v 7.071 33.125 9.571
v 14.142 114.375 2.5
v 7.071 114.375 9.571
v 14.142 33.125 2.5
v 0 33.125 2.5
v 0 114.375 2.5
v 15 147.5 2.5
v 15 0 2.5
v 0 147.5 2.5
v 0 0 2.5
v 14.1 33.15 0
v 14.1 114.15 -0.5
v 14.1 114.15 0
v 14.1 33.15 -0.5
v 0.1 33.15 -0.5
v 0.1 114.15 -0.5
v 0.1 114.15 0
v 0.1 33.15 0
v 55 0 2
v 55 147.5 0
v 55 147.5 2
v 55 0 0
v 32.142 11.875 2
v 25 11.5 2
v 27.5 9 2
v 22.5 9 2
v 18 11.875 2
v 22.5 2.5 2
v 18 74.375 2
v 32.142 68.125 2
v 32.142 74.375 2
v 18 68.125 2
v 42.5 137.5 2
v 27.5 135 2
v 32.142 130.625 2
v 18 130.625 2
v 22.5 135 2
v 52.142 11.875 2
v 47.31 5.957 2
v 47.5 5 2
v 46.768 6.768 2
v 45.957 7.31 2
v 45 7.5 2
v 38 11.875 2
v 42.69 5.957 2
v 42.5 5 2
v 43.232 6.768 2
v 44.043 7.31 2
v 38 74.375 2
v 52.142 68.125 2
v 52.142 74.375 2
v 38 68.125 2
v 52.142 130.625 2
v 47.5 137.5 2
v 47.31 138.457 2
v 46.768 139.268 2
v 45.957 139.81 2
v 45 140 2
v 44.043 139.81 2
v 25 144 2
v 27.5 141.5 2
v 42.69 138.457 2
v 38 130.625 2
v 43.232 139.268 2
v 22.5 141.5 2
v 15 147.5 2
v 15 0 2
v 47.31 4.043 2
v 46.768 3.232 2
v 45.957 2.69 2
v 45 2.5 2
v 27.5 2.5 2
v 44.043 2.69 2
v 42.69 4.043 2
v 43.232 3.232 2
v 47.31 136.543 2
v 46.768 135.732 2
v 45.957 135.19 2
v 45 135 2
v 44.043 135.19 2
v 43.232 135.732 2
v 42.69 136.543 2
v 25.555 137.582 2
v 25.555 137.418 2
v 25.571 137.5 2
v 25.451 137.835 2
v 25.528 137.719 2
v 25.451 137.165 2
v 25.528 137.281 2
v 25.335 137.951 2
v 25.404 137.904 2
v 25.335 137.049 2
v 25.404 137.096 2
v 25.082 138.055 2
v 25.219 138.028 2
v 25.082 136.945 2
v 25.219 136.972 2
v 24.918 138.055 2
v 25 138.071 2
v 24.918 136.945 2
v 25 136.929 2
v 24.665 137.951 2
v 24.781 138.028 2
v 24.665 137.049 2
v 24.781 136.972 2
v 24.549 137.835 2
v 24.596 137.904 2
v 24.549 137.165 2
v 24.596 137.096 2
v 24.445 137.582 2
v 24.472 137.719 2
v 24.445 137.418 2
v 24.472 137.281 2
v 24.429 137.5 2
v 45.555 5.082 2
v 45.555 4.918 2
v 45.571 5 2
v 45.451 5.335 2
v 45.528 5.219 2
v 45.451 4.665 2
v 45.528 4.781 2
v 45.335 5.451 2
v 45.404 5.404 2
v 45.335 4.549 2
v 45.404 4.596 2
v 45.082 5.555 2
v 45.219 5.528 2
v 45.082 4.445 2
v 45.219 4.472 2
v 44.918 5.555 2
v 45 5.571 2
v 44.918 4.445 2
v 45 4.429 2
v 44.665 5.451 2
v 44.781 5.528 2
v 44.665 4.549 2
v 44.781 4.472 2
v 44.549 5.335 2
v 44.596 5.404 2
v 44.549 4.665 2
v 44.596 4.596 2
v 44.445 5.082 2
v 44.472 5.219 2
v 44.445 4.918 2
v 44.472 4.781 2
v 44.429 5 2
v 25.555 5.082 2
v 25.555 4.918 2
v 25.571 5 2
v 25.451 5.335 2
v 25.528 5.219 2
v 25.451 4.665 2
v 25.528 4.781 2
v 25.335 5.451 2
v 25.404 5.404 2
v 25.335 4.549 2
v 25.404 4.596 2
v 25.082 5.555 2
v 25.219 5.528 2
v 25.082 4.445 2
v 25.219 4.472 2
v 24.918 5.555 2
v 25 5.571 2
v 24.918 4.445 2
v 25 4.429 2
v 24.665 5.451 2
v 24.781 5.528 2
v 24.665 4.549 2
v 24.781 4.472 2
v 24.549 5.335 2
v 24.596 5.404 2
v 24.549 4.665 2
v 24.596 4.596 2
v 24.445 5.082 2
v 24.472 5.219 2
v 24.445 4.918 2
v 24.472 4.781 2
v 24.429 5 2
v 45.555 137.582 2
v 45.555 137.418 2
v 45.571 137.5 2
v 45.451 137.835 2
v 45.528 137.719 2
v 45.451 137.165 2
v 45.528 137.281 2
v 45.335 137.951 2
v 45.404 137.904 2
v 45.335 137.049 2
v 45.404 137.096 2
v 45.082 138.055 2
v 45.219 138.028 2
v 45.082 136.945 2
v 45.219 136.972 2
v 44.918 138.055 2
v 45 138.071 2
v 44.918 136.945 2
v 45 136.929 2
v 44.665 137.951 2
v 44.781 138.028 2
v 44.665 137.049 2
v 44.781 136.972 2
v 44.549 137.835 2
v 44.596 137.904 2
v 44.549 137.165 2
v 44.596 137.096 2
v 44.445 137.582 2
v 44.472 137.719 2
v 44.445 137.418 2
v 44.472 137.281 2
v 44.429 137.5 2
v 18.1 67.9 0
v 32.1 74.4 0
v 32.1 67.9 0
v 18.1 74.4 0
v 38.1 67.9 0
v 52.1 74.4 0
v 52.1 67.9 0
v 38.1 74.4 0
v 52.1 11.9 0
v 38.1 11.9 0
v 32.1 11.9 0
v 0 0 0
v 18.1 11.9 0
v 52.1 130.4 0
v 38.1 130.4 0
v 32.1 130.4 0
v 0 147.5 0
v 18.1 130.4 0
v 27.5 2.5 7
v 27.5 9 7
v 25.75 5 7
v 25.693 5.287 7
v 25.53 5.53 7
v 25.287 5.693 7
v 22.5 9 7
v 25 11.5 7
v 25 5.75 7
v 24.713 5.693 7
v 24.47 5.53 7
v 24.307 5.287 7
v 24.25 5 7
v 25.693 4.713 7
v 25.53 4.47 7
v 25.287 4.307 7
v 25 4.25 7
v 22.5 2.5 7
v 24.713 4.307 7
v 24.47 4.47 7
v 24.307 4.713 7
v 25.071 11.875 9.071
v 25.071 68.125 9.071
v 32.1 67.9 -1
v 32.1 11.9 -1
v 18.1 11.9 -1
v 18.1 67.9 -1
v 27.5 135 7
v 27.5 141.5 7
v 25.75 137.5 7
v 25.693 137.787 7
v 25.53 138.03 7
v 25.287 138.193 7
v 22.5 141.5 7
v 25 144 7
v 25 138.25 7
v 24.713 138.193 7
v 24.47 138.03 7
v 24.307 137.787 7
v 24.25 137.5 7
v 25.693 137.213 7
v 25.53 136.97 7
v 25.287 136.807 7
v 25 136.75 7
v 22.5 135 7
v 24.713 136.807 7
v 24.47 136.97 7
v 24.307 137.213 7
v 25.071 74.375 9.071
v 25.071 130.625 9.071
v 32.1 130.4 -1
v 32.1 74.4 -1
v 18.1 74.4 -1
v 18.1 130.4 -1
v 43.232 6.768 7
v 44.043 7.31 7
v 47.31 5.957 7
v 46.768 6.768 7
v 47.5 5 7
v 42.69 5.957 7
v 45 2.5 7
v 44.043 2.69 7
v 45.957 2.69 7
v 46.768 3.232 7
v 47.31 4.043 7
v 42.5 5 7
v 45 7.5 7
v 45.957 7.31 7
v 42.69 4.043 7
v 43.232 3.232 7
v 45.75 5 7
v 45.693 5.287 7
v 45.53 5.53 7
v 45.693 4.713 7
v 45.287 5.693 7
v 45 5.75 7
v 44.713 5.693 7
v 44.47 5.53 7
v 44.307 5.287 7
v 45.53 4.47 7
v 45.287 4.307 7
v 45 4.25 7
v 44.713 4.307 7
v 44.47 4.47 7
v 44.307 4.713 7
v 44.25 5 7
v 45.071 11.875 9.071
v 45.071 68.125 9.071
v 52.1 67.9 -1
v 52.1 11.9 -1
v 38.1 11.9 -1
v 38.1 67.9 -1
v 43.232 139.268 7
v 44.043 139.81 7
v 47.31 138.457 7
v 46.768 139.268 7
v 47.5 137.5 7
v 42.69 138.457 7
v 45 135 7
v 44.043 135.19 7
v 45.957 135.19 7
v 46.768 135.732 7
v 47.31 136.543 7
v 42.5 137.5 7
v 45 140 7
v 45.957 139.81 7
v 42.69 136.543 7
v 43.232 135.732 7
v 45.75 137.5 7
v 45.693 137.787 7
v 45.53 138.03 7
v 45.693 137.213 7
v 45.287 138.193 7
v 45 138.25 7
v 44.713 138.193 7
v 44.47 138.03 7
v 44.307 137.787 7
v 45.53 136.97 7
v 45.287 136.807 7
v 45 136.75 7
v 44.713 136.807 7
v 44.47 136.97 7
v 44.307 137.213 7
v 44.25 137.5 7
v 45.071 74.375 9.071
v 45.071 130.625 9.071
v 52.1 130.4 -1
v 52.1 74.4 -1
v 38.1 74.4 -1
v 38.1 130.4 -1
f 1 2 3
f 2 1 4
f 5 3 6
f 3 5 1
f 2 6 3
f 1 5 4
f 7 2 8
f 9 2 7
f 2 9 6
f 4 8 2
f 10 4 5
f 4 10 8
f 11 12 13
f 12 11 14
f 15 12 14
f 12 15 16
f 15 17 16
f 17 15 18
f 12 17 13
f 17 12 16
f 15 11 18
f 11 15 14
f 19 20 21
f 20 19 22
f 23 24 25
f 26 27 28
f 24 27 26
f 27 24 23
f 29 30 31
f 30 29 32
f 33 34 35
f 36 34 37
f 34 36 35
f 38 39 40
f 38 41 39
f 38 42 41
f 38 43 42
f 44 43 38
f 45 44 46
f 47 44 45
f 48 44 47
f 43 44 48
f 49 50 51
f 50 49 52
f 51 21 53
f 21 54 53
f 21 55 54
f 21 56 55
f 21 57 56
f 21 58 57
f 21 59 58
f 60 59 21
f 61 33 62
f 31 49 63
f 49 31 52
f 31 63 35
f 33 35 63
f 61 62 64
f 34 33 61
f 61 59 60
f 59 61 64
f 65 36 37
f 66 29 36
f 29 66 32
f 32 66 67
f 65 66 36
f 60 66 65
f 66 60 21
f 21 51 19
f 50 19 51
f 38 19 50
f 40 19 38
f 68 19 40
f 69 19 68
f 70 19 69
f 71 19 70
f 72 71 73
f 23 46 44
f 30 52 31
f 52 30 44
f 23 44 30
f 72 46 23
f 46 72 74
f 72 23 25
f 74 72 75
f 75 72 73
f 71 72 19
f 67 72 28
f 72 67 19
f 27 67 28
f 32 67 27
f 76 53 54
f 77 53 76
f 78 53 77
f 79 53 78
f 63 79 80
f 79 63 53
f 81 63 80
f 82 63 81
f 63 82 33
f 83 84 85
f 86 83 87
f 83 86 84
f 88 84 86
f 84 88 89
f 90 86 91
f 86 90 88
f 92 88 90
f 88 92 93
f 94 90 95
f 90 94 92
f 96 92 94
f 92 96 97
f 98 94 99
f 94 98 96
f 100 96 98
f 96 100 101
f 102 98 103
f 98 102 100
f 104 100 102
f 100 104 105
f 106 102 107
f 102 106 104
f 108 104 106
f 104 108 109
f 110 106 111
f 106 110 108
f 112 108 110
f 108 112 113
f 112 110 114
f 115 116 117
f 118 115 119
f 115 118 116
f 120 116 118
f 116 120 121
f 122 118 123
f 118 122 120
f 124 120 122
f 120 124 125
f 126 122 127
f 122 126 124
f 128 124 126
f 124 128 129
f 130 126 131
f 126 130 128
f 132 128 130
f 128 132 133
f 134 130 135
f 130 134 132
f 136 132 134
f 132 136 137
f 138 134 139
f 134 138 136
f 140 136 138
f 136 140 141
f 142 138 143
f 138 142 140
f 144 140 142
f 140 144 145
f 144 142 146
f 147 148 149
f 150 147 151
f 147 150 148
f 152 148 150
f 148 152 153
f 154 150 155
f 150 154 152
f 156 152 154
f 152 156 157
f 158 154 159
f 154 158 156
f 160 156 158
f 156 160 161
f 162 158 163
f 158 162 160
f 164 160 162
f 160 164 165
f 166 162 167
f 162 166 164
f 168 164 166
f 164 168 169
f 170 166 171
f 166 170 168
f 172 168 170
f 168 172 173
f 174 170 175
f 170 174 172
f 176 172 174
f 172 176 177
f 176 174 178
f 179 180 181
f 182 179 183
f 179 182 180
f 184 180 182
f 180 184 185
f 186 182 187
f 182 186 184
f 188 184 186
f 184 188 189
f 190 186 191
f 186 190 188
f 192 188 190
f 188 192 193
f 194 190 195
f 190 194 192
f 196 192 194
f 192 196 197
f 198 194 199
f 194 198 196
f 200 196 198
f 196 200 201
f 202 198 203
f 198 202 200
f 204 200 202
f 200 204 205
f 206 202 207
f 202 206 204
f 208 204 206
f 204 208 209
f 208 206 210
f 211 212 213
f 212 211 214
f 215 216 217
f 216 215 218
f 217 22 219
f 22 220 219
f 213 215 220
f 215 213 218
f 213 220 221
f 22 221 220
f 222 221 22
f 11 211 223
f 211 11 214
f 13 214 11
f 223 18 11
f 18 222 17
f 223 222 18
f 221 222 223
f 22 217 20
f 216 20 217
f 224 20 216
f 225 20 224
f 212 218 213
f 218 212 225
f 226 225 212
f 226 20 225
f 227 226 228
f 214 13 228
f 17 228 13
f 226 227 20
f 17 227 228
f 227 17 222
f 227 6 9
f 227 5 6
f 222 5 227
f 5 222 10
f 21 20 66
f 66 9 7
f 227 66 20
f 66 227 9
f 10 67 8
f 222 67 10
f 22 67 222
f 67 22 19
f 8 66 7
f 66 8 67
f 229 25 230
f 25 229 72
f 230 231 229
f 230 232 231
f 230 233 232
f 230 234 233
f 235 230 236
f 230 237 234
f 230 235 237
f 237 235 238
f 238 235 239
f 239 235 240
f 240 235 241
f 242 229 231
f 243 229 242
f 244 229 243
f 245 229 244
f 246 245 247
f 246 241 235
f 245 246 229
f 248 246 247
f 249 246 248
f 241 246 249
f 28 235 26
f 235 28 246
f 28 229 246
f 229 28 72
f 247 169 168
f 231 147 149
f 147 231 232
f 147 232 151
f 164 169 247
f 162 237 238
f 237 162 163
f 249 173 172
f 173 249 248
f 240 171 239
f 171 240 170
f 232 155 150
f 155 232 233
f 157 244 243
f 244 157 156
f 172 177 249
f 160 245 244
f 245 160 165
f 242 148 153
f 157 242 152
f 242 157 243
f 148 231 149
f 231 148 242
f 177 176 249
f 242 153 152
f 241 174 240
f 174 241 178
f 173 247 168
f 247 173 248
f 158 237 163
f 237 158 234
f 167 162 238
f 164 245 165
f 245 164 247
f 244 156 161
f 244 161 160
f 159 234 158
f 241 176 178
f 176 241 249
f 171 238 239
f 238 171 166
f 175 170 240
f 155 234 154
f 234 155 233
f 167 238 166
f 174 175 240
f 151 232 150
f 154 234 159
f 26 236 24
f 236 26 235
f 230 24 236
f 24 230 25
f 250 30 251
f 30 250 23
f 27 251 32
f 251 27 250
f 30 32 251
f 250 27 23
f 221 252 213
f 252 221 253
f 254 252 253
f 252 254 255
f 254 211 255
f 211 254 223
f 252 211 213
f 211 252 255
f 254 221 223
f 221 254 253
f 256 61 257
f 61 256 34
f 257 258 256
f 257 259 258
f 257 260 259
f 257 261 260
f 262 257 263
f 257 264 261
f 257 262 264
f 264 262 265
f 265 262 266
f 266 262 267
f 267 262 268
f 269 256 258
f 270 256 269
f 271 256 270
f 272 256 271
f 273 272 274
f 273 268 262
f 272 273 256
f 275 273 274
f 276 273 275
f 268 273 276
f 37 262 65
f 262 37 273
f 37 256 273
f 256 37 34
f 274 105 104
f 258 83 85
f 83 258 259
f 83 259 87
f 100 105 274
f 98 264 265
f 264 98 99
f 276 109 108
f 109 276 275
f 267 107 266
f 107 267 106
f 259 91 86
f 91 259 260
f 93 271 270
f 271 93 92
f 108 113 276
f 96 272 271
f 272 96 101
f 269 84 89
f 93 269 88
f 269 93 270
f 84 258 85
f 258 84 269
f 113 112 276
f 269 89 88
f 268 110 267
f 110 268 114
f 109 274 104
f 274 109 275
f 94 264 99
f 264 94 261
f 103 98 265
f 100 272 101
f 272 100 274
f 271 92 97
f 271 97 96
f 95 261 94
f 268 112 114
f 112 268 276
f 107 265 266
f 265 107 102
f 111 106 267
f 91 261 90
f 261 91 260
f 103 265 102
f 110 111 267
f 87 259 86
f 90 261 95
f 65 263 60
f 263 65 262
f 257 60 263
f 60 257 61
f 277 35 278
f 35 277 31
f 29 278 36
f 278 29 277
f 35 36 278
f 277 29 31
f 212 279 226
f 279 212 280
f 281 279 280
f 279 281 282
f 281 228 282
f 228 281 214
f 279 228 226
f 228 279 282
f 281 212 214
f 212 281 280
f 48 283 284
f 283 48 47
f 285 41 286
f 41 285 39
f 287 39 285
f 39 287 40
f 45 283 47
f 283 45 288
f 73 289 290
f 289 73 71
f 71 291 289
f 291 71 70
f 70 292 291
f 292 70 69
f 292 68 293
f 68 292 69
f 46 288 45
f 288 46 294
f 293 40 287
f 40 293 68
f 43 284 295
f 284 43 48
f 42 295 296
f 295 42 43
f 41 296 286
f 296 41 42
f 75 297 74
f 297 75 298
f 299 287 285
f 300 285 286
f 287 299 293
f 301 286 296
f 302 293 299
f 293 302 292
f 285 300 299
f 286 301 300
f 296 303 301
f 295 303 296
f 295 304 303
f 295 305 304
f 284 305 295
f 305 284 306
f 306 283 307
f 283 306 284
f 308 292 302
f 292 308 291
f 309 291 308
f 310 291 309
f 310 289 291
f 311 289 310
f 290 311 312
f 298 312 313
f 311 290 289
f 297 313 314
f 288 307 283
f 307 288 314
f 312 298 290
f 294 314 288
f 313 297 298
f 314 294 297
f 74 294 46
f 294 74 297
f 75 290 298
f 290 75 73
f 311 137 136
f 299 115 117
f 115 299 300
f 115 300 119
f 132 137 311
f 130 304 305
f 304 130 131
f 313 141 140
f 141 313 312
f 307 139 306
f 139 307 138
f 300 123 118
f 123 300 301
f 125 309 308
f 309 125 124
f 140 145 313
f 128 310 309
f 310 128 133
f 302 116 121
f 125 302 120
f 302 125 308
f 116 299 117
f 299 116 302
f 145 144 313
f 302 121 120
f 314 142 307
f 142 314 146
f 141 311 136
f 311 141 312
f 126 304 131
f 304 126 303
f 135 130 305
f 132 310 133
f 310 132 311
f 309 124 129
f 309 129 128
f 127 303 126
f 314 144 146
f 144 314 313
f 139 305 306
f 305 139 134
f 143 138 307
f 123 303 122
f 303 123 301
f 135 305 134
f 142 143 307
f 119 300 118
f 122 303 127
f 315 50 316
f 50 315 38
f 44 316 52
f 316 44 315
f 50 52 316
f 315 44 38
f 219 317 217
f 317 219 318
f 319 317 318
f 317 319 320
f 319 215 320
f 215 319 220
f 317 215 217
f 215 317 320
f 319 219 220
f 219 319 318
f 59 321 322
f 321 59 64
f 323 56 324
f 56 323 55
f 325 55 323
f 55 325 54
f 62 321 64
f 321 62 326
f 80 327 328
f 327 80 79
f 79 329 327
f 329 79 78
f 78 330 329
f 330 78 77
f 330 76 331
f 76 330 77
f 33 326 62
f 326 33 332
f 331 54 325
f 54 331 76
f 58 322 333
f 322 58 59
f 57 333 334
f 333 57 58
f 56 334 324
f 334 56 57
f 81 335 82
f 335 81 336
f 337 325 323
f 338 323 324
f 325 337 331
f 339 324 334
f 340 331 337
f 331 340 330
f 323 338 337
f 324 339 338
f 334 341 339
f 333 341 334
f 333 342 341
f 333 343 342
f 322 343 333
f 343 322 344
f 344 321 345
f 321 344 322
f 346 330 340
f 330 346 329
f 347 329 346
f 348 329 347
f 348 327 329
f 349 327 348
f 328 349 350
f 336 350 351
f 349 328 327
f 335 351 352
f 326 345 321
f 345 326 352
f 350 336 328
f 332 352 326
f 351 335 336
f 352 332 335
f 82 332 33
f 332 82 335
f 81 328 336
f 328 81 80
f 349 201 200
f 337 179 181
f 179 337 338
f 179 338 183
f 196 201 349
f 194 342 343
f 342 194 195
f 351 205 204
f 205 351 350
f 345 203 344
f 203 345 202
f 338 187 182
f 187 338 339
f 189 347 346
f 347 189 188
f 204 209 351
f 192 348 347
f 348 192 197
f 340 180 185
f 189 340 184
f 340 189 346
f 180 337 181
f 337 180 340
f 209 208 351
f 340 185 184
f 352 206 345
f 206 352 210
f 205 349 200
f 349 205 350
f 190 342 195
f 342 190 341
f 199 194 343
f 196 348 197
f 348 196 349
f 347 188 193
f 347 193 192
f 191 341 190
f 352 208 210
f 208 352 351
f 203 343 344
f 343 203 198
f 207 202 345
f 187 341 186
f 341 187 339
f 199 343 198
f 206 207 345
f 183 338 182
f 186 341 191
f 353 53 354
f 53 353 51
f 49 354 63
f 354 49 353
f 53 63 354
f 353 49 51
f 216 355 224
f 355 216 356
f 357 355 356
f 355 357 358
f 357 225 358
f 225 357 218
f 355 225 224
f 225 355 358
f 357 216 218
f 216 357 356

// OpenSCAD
// file: ../OpenSCAD/Pin.scad
// Height of pins
pinHeight = 7;      // was 7
// ----------------------------------------------------- //
// Draw a cylinder and drill a hole in it                //
// ----------------------------------------------------- //
module pin(px, py, pz) {
    translate([px, py, pz]) {
        difference() {
            cylinder(h=pinHeight, r=2.5, $fn=16);
            translate([2, 2, 1]);
                cylinder(h=pinHeight, r1=0.5, r2=0.75, $fn=16);
        }
    }   
}

// pin(0, 0, 0);
// file: ../OpenSCAD/brailleAndText.scad
/*
Braille Module
http://creativecommons.org/licenses/by/3.0/
*/


// mm sizes from http://dots.physics.orst.edu/gs_layout.html
radius = 0.25;
spacing = 2.5;
startOffset = 3.75;
distance = startOffset + spacing;

plate_height = 10;
plate_thickness = 10;   // was 2.

$fn = 10;



module letter(bitmap, char) {
//    echo(char);
	row_size = 2;
	col_size = 3;
	bitmap_size = row_size * col_size;
	
	function loc_x(loc) = floor(loc / row_size) * spacing + spacing;
	function loc_y(loc) = loc % row_size * spacing  + (distance-spacing)/2;

    translate([0, loc_y(-1), -2]) {
        rotate([270, 0, 90]) {
            linear_extrude(height = 1.25)
            text(char, 6);
        }
    }
	
    for (loc = [0:bitmap_size - 1]) {
		if (bitmap[loc] != 0) {
			union() {
				translate(v = [loc_x(loc), loc_y(loc), 0]) {
					sphere(radius = radius* bitmap[loc], center = true);
				}
			}
		}
	}
}


module braille_char(char) {
	if (char == "A" || char == "a") {
		letter([
			1,0,
			0,0,
			0,0
		], char);
	} else if (char == "B" || char == "b") {
		letter([
			1,0,
			1,0,
			0,0
		], char);
	} else if (char == "C" || char == "c") {
		letter([
			1,1,
			0,0,
			0,0
		], char);
	} else if (char == "D" || char == "d") {
		letter([
			1,1,
			0,1,
			0,0
		], char);
	} else if (char == "E" || char == "e") {
		letter([
			1,0,
			0,1,
			0,0
		], char);
	} else if (char == "F" || char == "f") {
		letter([
			1,1,
			1,0,
			0,0
		], char);
	} else if (char == "G" || char == "g") {
		letter([
			1,1,
			1,1,
			0,0
		], char);
	} else if (char == "H" || char == "h") {
		letter([
			1,0,
			1,1,
			0,0
		], char);
	} else if (char == "I" || char == "i") {
		letter([
			0,1,
			1,0,
			0,0
		], char);
	} else if (char == "J" || char == "j") {
		letter([
			0,1,
			1,1,
			0,0
		], char);
	} else if (char == "K" || char == "k") {
		letter([
			1,0,
			0,0,
			1,0
		], char);
	} else if (char == "L" || char == "l") {
		letter([
			1,0,
			1,0,
			1,0
		], char);
	} else if (char == "M" || char == "m") {
		letter([
			1,1,
			0,0,
			1,0
		], char);
	} else if (char == "N" || char == "n") {
		letter([
			1,1,
			0,1,
			1,0
		], char);
	} else if (char == "O" || char == "o") {
		letter([
			1,0,
			0,1,
			1,0
		], char);
	} else if (char == "P" || char == "p") {
		letter([
			1,1,
			1,0,
			1,0
		], char);
	} else if (char == "Q" || char == "q") {
		letter([
			1,1,
			1,1,
			1,0
		], char);
	} else if (char == "R" || char == "r") {
		letter([
			1,0,
			1,1,
			1,0
		], char);
	} else if (char == "S" || char == "s") {
		letter([
			0,1,
			1,0,
			1,0
		], char);
	} else if (char == "T" || char == "t") {
		letter([
			0,1,
			1,1,
			1,0
		], char);
	} else if (char == "U" || char == "u") {
		letter([
			1,0,
			0,0,
			1,1
		], char);
	} else if (char == "V" || char == "v") {
		letter([
			1,0,
			1,1,
			1,0
		], char);
	} else if (char == "W" || char == "w") {
		letter([
			0,1,
			1,1,
			0,1
		], char);
	} else if (char == "X" || char == "x") {
		letter([
			1,1,
			0,0,
			1,1
		], char);
	} else if (char == "Y" || char == "y") {
		letter([
			1,1,
			0,1,
			1,1
		], char);
	} else if (char == "Z" || char == "z") {
		letter([
			1,0,
			0,1,
			1,1
		], char);
    } else if (char == " ") {
		letter([
			0,0,
			0,0,
			0,0
		], char);
	} else {
		echo("Invalid Character: ", char);
	}

}

module braille_str(chars) {
    char_count = len(chars);
	echo(str("Total Width of ", chars, " : ",  distance * char_count, "mm"));
	union() {
		for (count = [0:char_count-1]) {
			translate(v = [0, count * distance, plate_thickness]) {
				braille_char(chars[count]);
			}
		}
		translate(v = [0, -distance/2, 0]) {
			color([0,0,1]) {
				cube(size = [plate_height, distance * (char_count+1), plate_thickness]);
			}
            }                                                      
	}
}

function lenText(txt="Hi") = distance * len(txt);

module printTextAndBraille(textToPrint) {
    blockLen = lenText(textToPrint);
    union()
    {
        difference() {                      // remove second box from first
            rotate([0,45,0]) {              // make it on its edge
                braille_str((textToPrint)); // make a long box
            }
            translate([0, -3.25, -8]) {     // move in right place
                cube(size = [14, (blockLen+8), 8]);
            }
        } 
        translate([0.1, -3.1, -3]) {     // move in right place
            cube(size = [14, (blockLen+6), 3]); 
        }
    }                                 
}

printTextAndBraille("HELLO CalLUM");
// file: ../OpenSCAD/BPNode.scad
use <brailleAndText.scad>;
use <Pin.scad>;

// These are to be overridden in the generated file
// ... they are used to calculate size of base.
numLines = 1;  // was 5
longestLine = "abcdefghijk";

// Thickness of base
bedHeight = 2;      // was 4
// Thickness of top section
reliefHeight = 2.5;   // was 6
// Height of pins
pinHeight = 7;      // was 7

// size of base
baseWidth = 35 + len(longestLine) * 6.25;   // was 40
//baseWidth = 100;
baseDepth = (numLines - 1) * 20 + 15;
// depth of top section
reliefDepth = 15;

// Offsets for each line
line1 = 7;
line2 = line1 + 18;
line3 = line2 + 20;
line4 = line3 + 20;
line5 = line4 + 20;
line6 = line5 + 20;
line7 = line6 + 20;
line8 = line7 + 20;

// offset for items on the left and right
left = 5;
right = baseWidth - 10;


// ----------------------------------------------------- //
// Draw base, add raised area for title and add title    //
// ----------------------------------------------------- //
module drawBase(title) { 
    cube([baseDepth,baseWidth,bedHeight]);      // Base
    cube([reliefDepth,baseWidth,reliefHeight]); // Top
    translate([0, (baseWidth/2 - lenText(title)/2), reliefHeight])
        printTextAndBraille(title);             // Title
}

// -------------------------------------------------------------- //
// Draw cube and drill a hole in it,                              //
// - then add a cylinder made with four segments (i.e. a diamond) //
// -------------------------------------------------------------- //
module executePin(px, py) {
    translate([px, py, 0]) {
        difference() {
            translate([-2.5, -2.5, 0])
            cube([5, 6.5, pinHeight]);
            translate([2, 2, 1]);
            cylinder(h=pinHeight, r1=0.5, r2=0.75, $fn=16);
        }
        translate([0, 4, 0])
        cylinder(h=pinHeight, r=2.5, $fn=4);
    } 
}

module executePinLeft(line) {
   executePin(line2, left);
} 

module executePinRight(line) {
   executePin(line2, right);
} 

module executePinLeftWithText(px, text) {
    executePin(px, left);
    printText(px, left, text);    
}

module executePinRightWithText(px, text) {
    y = lenText(text) + 20 ;  
    executePin(px, right);
    printText(px, right - y, text);    
}


// ----------------------------------------------------- //
// Call module from 'brailleAndText' library to draw     //
// ... text and braille                                  //
// ----------------------------------------------------- //
module printText(px, py, textValue) {
    translate([px - 7, py + 10, bedHeight]) {
        printTextAndBraille(textValue);
    }
}

// ----------------------------------------------------- //
// Call modules to draw pin and text on the left         //
// ----------------------------------------------------- //
module leftPin(line, text) {   
    pin(line, left, 0);
    printText(line, left, text);
}

// ----------------------------------------------------- //
// Call modules to draw pin and text on the right        //
// ----------------------------------------------------- //
module rightPin(line, text) {
    y = lenText(text) + 20 ;  
    pin(line, right, 0);
    printText(line, right - y, text);
}


// ------------------------------------------------------------- //
// ------------------------------------------------------------- //
//                        T O    U S E  ;                        //
// 1. Create file and add the following line at the top;         //
// include <BPNode.scad>;                                        //
// 2. Change value of numLines and longestLine, as appropritate. //
// 3. Add any of the other commands below, as appropriate.       //
// ------------------------------------------------------------- //
// ------------------------------------------------------------- //


/*
// include <BPNode.scad>; 
numLines = 5;
longestLine = "abcdefghijk";

drawBase("Print");

executePinLeft(line2);
//executePinLeftWithText(line2, "TestA");
executePinRight(line2);
//executePinRightWithText(line2, "TestB");

leftPin(line3, "String");
leftPin(line4, "Text"); 
leftPin(line5, "Log"); 

rightPin(line3, "Out");
*/
// main file
include <../OpenSCAD/BPNode.scad>;

numLines = 3;
longestLine = "                  ";

drawBase("            ");

executePinLeftWithText(line2,"        ");
executePinRightWithText(line2, "        ");

leftPin(line3, "        ");
rightPin(line3, "        ");
